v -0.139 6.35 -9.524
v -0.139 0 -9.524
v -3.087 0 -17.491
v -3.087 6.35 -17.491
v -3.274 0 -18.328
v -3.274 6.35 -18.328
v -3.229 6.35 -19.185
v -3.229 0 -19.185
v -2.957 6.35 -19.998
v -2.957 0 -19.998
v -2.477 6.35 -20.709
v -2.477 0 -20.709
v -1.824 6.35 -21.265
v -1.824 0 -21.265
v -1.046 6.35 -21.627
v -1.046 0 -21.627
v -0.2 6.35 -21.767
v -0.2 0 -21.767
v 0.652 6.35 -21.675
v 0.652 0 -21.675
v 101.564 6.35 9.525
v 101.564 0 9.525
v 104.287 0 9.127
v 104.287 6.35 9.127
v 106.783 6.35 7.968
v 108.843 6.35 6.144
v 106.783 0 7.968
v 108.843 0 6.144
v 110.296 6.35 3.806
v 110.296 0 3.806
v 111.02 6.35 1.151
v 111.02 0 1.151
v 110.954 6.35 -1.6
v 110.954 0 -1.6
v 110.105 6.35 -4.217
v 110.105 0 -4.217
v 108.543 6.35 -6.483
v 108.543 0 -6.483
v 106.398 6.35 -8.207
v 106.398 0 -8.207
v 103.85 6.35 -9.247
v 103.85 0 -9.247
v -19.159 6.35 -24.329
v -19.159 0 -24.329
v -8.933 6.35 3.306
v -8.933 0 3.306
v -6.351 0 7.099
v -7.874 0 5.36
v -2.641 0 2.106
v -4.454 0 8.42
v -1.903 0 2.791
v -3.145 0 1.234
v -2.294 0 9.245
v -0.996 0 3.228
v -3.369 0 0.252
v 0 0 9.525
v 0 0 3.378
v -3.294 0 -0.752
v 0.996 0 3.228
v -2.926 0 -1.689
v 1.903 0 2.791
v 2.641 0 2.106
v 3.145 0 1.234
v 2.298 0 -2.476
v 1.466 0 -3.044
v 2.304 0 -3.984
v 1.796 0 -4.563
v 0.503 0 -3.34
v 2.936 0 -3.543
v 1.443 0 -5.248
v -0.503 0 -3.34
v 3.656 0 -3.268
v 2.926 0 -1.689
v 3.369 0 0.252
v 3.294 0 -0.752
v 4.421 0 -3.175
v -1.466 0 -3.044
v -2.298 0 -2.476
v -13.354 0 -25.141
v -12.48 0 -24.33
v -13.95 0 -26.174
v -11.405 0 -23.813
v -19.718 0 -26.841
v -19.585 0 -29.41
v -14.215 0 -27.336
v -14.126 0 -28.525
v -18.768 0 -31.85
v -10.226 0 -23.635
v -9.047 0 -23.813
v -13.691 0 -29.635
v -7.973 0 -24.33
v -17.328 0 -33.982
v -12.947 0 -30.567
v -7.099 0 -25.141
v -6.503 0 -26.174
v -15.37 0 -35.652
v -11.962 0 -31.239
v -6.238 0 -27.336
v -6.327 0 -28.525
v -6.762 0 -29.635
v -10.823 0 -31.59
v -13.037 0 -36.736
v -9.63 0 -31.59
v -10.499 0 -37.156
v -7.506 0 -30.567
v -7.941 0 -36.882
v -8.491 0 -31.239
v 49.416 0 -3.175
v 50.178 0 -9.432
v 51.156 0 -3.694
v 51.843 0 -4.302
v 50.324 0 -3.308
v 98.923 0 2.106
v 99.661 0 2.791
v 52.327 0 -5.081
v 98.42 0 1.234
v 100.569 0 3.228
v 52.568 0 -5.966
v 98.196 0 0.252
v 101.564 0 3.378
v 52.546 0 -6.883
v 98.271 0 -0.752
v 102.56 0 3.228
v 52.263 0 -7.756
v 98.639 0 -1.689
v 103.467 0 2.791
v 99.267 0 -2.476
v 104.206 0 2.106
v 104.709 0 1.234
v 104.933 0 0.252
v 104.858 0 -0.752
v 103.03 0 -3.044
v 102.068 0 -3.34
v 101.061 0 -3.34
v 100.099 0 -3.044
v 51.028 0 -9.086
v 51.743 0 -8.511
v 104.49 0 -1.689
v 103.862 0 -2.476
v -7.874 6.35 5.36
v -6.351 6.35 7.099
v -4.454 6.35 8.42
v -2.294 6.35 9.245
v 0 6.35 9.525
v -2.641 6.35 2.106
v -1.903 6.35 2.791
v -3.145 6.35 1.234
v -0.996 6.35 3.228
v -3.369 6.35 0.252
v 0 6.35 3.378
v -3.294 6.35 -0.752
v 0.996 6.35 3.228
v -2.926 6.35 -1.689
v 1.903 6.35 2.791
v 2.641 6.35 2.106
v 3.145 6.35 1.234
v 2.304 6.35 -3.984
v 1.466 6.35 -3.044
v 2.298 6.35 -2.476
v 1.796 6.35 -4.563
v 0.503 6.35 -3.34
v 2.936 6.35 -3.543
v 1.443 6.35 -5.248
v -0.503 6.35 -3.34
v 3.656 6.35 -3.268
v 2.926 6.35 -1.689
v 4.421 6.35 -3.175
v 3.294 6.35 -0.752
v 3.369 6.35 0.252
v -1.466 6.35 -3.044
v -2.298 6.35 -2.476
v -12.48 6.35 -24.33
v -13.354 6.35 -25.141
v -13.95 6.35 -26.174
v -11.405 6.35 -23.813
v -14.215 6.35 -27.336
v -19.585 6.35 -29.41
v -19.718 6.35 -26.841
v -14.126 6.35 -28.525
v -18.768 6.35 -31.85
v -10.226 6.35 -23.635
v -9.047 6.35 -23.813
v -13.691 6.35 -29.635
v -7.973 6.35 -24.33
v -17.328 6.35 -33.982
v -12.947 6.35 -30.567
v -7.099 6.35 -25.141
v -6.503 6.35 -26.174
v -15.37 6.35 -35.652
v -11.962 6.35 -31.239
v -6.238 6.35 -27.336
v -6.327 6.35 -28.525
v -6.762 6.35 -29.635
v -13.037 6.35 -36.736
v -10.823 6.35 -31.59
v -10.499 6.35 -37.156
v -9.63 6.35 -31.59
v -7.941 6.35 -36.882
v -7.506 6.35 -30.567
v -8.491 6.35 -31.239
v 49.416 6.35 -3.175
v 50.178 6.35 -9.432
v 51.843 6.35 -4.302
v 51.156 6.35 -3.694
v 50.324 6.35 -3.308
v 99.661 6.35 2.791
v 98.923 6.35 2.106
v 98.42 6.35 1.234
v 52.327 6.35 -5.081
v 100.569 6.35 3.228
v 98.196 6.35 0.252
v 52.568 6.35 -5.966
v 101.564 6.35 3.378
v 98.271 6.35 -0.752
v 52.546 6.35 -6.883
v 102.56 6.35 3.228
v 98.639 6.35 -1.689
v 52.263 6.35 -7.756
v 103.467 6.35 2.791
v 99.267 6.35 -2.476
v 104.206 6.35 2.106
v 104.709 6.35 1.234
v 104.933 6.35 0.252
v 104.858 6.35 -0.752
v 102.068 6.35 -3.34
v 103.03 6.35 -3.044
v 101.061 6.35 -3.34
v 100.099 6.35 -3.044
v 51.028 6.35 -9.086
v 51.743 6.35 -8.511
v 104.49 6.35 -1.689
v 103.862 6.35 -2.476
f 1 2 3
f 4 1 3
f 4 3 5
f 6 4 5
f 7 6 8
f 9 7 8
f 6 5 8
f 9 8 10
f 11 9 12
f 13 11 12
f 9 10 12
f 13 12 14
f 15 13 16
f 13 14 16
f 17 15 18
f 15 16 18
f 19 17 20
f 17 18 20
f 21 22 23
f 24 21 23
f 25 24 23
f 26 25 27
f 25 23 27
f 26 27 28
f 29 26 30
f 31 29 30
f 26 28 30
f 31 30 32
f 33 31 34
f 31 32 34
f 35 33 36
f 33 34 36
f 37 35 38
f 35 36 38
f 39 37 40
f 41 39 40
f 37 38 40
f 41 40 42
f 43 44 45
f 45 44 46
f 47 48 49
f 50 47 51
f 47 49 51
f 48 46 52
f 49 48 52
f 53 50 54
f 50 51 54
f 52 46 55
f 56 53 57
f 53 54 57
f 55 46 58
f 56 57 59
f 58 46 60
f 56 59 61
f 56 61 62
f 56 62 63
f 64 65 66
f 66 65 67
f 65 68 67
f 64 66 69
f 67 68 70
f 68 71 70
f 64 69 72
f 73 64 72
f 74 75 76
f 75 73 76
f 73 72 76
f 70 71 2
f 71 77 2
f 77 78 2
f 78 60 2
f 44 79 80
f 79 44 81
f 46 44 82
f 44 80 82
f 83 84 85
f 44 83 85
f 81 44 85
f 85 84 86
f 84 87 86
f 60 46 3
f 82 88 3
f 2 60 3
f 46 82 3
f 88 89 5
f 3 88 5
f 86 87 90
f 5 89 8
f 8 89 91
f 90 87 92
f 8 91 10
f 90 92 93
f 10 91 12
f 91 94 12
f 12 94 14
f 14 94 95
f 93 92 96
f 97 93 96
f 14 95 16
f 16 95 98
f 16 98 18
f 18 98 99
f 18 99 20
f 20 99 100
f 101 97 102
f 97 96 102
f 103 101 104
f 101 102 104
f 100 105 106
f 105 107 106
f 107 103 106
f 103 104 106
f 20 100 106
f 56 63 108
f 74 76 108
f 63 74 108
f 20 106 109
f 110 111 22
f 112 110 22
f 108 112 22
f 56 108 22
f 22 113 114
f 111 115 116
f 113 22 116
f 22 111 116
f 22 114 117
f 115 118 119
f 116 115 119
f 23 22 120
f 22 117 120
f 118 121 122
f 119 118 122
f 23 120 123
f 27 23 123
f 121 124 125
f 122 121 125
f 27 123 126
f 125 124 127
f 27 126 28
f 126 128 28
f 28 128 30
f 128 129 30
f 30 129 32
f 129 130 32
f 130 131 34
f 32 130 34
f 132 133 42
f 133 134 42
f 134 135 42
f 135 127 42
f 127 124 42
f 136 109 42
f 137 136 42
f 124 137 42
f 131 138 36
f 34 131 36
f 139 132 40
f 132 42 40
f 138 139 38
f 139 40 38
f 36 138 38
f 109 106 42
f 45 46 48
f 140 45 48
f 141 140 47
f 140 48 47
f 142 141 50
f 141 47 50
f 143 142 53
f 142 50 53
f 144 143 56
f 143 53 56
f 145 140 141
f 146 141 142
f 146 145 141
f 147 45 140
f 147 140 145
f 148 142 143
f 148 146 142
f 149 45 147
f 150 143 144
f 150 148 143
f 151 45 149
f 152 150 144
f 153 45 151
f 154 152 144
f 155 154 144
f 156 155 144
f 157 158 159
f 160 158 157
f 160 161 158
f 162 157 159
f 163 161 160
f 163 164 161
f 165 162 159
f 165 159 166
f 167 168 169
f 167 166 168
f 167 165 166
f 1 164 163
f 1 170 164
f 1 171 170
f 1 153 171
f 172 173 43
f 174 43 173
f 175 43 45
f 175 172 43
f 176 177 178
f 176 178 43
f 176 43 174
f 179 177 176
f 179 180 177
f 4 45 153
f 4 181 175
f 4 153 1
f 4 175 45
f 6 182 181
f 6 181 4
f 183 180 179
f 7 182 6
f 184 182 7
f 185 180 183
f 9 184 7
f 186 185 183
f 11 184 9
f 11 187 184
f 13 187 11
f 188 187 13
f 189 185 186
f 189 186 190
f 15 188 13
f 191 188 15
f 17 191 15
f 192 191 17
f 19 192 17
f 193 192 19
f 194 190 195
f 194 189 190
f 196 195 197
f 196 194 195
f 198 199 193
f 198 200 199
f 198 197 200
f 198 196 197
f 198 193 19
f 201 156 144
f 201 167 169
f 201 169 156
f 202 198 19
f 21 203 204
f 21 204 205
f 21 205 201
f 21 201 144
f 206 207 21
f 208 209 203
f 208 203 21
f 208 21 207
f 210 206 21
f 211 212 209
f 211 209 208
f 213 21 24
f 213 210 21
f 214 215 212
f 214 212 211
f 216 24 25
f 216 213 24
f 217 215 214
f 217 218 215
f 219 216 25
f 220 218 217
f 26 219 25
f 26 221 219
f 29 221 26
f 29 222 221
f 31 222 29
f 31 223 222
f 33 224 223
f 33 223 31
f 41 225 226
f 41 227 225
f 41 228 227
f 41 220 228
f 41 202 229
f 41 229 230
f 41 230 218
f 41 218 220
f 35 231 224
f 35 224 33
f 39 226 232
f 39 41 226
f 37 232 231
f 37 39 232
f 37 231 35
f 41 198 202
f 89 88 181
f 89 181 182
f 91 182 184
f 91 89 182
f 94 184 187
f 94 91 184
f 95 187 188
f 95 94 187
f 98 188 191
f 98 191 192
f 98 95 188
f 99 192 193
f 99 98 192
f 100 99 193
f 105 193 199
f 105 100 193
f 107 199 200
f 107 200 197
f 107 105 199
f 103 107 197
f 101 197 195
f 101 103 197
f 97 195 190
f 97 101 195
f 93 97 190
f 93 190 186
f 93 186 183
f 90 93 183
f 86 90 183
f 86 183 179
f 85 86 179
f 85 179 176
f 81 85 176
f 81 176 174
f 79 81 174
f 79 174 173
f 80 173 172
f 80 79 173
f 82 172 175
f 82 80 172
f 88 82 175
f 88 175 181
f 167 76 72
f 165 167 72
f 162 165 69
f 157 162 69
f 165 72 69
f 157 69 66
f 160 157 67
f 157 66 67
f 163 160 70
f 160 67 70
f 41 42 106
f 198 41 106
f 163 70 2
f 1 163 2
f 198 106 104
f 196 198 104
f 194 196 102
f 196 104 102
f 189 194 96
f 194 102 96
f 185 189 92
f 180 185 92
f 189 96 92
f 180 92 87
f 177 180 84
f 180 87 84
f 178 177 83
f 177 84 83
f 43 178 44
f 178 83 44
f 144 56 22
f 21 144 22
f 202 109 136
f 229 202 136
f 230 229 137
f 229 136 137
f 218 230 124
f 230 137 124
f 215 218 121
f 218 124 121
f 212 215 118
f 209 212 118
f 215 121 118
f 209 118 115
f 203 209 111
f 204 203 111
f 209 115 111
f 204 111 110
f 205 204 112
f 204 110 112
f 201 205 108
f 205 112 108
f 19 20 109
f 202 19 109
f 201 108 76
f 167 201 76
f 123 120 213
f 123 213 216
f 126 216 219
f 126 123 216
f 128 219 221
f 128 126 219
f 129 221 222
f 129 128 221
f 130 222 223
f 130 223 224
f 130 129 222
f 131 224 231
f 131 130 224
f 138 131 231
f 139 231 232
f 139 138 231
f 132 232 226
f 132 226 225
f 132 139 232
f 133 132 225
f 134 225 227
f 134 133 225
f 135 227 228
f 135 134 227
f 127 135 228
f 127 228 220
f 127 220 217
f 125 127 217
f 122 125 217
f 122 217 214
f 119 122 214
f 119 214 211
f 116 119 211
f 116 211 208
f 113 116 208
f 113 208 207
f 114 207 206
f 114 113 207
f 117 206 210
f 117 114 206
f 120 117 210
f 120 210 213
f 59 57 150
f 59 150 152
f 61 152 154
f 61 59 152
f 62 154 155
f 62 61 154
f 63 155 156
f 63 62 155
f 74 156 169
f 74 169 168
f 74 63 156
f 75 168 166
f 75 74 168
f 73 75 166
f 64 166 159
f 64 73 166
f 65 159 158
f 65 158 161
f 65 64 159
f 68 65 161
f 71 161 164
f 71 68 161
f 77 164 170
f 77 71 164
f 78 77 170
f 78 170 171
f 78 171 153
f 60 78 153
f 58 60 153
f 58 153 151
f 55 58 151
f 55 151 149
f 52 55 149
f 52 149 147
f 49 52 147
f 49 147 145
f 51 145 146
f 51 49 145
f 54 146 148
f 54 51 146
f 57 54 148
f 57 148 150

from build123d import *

# Parameters (mm, degrees)
SKETCH1_R           = 3.3782
SKETCH1_R_2         = 9.525
SKETCH1_R_3         = 4
BOSS_EXTRUDE2_DEPTH = 6.35


with BuildPart() as part:
    # Sketch1 → Boss-Extrude2 (new body)
    # profile 1 of 4: a face of its own
    with BuildSketch(Plane(origin=(0, 0, 0), x_dir=(1, 0, 0), z_dir=(0, 1, 0))):
        with BuildLine():
            ThreePointArc((-0.701449718, 27.635062977), (-8.547313496, 18.259236264), (-19.159429046, 24.329385234))
            Line((-19.159429046, 24.329385234), (-8.932978817, -3.305679122))
            ThreePointArc((-8.932978817, -3.305679122), (-7.856533502, 5.385211819), (-0.13896483, 9.523986234))
            Line((-0.13896483, 9.523986234), (-3.087221692, 17.491097626))
            ThreePointArc((-3.087221692, 17.491097626), (-2.476851738, 20.708780169), (0.652372477, 21.67521084))
            Line((0.652372477, 21.67521084), (50.178397804, 9.432220088))
            ThreePointArc((50.178397804, 9.432220088), (52.568182882, 5.966218669), (49.41646321, 3.175))
            Line((49.41646321, 3.175), (8.980256121, 3.175))
            ThreePointArc((8.980256121, 3.175), (9.387826281, 1.610696347), (9.525, 0))
            ThreePointArc((9.525, 0), (6.735192091, -6.735192091), (0, -9.525))
            Line((0, -9.525), (101.56444, -9.525))
            ThreePointArc((101.56444, -9.525), (92.109281021, 1.151344291), (103.850244371, 9.24666012))
            Line((103.850244371, 9.24666012), (-7.94064525, 36.881723073))
            ThreePointArc((-7.94064525, 36.881723073), (-2.7265193, 33.506746613), (-0.701449718, 27.635062977))
        make_face()
    # profile 2 of 4: a face of its own
    with BuildSketch(Plane(origin=(0, 0, 0), x_dir=(1, 0, 0), z_dir=(0, 1, 0))):
        with BuildLine():
            ThreePointArc((-0.13896483, 9.523986234), (-7.856533502, 5.385211819), (-8.932978817, -3.305679122))
            ThreePointArc((-8.932978817, -3.305679122), (-5.442381435, -7.817039678), (0, -9.525))
            ThreePointArc((0, -9.525), (6.735192091, -6.735192091), (9.525, 0))
            ThreePointArc((9.525, 0), (9.387826281, 1.610696347), (8.980256121, 3.175))
            Line((8.980256121, 3.175), (4.420998548, 3.175))
            ThreePointArc((4.420998548, 3.175), (2.60687144, 3.744320082), (1.443338974, 5.248106875))
            Line((1.443338974, 5.248106875), (-0.13896483, 9.523986234))
        make_face()
        with Locations(Location((0, 0, 0), (0, 0, 270))):
            Circle(SKETCH1_R, mode=Mode.SUBTRACT)
    # profile 3 of 4: a face of its own
    with BuildSketch(Plane(origin=(0, 0, 0), x_dir=(1, 0, 0), z_dir=(0, 1, 0))):
        with Locations((101.56444, 0)):
            Circle(SKETCH1_R_2)
        with Locations(Location((101.56444, 0, 0), (0, 0, 270))):
            Circle(SKETCH1_R, mode=Mode.SUBTRACT)
    # profile 4 of 4: a face of its own
    with BuildSketch(Plane(origin=(0, 0, 0), x_dir=(1, 0, 0), z_dir=(0, 1, 0))):
        with Locations((-10.226449718, 27.635062977)):
            Circle(SKETCH1_R_2)
        with Locations(Location((-10.226449718, 27.635062977, 0), (0, 0, 270))):
            Circle(SKETCH1_R_3, mode=Mode.SUBTRACT)
    extrude(amount=BOSS_EXTRUDE2_DEPTH)


solid = part.part
